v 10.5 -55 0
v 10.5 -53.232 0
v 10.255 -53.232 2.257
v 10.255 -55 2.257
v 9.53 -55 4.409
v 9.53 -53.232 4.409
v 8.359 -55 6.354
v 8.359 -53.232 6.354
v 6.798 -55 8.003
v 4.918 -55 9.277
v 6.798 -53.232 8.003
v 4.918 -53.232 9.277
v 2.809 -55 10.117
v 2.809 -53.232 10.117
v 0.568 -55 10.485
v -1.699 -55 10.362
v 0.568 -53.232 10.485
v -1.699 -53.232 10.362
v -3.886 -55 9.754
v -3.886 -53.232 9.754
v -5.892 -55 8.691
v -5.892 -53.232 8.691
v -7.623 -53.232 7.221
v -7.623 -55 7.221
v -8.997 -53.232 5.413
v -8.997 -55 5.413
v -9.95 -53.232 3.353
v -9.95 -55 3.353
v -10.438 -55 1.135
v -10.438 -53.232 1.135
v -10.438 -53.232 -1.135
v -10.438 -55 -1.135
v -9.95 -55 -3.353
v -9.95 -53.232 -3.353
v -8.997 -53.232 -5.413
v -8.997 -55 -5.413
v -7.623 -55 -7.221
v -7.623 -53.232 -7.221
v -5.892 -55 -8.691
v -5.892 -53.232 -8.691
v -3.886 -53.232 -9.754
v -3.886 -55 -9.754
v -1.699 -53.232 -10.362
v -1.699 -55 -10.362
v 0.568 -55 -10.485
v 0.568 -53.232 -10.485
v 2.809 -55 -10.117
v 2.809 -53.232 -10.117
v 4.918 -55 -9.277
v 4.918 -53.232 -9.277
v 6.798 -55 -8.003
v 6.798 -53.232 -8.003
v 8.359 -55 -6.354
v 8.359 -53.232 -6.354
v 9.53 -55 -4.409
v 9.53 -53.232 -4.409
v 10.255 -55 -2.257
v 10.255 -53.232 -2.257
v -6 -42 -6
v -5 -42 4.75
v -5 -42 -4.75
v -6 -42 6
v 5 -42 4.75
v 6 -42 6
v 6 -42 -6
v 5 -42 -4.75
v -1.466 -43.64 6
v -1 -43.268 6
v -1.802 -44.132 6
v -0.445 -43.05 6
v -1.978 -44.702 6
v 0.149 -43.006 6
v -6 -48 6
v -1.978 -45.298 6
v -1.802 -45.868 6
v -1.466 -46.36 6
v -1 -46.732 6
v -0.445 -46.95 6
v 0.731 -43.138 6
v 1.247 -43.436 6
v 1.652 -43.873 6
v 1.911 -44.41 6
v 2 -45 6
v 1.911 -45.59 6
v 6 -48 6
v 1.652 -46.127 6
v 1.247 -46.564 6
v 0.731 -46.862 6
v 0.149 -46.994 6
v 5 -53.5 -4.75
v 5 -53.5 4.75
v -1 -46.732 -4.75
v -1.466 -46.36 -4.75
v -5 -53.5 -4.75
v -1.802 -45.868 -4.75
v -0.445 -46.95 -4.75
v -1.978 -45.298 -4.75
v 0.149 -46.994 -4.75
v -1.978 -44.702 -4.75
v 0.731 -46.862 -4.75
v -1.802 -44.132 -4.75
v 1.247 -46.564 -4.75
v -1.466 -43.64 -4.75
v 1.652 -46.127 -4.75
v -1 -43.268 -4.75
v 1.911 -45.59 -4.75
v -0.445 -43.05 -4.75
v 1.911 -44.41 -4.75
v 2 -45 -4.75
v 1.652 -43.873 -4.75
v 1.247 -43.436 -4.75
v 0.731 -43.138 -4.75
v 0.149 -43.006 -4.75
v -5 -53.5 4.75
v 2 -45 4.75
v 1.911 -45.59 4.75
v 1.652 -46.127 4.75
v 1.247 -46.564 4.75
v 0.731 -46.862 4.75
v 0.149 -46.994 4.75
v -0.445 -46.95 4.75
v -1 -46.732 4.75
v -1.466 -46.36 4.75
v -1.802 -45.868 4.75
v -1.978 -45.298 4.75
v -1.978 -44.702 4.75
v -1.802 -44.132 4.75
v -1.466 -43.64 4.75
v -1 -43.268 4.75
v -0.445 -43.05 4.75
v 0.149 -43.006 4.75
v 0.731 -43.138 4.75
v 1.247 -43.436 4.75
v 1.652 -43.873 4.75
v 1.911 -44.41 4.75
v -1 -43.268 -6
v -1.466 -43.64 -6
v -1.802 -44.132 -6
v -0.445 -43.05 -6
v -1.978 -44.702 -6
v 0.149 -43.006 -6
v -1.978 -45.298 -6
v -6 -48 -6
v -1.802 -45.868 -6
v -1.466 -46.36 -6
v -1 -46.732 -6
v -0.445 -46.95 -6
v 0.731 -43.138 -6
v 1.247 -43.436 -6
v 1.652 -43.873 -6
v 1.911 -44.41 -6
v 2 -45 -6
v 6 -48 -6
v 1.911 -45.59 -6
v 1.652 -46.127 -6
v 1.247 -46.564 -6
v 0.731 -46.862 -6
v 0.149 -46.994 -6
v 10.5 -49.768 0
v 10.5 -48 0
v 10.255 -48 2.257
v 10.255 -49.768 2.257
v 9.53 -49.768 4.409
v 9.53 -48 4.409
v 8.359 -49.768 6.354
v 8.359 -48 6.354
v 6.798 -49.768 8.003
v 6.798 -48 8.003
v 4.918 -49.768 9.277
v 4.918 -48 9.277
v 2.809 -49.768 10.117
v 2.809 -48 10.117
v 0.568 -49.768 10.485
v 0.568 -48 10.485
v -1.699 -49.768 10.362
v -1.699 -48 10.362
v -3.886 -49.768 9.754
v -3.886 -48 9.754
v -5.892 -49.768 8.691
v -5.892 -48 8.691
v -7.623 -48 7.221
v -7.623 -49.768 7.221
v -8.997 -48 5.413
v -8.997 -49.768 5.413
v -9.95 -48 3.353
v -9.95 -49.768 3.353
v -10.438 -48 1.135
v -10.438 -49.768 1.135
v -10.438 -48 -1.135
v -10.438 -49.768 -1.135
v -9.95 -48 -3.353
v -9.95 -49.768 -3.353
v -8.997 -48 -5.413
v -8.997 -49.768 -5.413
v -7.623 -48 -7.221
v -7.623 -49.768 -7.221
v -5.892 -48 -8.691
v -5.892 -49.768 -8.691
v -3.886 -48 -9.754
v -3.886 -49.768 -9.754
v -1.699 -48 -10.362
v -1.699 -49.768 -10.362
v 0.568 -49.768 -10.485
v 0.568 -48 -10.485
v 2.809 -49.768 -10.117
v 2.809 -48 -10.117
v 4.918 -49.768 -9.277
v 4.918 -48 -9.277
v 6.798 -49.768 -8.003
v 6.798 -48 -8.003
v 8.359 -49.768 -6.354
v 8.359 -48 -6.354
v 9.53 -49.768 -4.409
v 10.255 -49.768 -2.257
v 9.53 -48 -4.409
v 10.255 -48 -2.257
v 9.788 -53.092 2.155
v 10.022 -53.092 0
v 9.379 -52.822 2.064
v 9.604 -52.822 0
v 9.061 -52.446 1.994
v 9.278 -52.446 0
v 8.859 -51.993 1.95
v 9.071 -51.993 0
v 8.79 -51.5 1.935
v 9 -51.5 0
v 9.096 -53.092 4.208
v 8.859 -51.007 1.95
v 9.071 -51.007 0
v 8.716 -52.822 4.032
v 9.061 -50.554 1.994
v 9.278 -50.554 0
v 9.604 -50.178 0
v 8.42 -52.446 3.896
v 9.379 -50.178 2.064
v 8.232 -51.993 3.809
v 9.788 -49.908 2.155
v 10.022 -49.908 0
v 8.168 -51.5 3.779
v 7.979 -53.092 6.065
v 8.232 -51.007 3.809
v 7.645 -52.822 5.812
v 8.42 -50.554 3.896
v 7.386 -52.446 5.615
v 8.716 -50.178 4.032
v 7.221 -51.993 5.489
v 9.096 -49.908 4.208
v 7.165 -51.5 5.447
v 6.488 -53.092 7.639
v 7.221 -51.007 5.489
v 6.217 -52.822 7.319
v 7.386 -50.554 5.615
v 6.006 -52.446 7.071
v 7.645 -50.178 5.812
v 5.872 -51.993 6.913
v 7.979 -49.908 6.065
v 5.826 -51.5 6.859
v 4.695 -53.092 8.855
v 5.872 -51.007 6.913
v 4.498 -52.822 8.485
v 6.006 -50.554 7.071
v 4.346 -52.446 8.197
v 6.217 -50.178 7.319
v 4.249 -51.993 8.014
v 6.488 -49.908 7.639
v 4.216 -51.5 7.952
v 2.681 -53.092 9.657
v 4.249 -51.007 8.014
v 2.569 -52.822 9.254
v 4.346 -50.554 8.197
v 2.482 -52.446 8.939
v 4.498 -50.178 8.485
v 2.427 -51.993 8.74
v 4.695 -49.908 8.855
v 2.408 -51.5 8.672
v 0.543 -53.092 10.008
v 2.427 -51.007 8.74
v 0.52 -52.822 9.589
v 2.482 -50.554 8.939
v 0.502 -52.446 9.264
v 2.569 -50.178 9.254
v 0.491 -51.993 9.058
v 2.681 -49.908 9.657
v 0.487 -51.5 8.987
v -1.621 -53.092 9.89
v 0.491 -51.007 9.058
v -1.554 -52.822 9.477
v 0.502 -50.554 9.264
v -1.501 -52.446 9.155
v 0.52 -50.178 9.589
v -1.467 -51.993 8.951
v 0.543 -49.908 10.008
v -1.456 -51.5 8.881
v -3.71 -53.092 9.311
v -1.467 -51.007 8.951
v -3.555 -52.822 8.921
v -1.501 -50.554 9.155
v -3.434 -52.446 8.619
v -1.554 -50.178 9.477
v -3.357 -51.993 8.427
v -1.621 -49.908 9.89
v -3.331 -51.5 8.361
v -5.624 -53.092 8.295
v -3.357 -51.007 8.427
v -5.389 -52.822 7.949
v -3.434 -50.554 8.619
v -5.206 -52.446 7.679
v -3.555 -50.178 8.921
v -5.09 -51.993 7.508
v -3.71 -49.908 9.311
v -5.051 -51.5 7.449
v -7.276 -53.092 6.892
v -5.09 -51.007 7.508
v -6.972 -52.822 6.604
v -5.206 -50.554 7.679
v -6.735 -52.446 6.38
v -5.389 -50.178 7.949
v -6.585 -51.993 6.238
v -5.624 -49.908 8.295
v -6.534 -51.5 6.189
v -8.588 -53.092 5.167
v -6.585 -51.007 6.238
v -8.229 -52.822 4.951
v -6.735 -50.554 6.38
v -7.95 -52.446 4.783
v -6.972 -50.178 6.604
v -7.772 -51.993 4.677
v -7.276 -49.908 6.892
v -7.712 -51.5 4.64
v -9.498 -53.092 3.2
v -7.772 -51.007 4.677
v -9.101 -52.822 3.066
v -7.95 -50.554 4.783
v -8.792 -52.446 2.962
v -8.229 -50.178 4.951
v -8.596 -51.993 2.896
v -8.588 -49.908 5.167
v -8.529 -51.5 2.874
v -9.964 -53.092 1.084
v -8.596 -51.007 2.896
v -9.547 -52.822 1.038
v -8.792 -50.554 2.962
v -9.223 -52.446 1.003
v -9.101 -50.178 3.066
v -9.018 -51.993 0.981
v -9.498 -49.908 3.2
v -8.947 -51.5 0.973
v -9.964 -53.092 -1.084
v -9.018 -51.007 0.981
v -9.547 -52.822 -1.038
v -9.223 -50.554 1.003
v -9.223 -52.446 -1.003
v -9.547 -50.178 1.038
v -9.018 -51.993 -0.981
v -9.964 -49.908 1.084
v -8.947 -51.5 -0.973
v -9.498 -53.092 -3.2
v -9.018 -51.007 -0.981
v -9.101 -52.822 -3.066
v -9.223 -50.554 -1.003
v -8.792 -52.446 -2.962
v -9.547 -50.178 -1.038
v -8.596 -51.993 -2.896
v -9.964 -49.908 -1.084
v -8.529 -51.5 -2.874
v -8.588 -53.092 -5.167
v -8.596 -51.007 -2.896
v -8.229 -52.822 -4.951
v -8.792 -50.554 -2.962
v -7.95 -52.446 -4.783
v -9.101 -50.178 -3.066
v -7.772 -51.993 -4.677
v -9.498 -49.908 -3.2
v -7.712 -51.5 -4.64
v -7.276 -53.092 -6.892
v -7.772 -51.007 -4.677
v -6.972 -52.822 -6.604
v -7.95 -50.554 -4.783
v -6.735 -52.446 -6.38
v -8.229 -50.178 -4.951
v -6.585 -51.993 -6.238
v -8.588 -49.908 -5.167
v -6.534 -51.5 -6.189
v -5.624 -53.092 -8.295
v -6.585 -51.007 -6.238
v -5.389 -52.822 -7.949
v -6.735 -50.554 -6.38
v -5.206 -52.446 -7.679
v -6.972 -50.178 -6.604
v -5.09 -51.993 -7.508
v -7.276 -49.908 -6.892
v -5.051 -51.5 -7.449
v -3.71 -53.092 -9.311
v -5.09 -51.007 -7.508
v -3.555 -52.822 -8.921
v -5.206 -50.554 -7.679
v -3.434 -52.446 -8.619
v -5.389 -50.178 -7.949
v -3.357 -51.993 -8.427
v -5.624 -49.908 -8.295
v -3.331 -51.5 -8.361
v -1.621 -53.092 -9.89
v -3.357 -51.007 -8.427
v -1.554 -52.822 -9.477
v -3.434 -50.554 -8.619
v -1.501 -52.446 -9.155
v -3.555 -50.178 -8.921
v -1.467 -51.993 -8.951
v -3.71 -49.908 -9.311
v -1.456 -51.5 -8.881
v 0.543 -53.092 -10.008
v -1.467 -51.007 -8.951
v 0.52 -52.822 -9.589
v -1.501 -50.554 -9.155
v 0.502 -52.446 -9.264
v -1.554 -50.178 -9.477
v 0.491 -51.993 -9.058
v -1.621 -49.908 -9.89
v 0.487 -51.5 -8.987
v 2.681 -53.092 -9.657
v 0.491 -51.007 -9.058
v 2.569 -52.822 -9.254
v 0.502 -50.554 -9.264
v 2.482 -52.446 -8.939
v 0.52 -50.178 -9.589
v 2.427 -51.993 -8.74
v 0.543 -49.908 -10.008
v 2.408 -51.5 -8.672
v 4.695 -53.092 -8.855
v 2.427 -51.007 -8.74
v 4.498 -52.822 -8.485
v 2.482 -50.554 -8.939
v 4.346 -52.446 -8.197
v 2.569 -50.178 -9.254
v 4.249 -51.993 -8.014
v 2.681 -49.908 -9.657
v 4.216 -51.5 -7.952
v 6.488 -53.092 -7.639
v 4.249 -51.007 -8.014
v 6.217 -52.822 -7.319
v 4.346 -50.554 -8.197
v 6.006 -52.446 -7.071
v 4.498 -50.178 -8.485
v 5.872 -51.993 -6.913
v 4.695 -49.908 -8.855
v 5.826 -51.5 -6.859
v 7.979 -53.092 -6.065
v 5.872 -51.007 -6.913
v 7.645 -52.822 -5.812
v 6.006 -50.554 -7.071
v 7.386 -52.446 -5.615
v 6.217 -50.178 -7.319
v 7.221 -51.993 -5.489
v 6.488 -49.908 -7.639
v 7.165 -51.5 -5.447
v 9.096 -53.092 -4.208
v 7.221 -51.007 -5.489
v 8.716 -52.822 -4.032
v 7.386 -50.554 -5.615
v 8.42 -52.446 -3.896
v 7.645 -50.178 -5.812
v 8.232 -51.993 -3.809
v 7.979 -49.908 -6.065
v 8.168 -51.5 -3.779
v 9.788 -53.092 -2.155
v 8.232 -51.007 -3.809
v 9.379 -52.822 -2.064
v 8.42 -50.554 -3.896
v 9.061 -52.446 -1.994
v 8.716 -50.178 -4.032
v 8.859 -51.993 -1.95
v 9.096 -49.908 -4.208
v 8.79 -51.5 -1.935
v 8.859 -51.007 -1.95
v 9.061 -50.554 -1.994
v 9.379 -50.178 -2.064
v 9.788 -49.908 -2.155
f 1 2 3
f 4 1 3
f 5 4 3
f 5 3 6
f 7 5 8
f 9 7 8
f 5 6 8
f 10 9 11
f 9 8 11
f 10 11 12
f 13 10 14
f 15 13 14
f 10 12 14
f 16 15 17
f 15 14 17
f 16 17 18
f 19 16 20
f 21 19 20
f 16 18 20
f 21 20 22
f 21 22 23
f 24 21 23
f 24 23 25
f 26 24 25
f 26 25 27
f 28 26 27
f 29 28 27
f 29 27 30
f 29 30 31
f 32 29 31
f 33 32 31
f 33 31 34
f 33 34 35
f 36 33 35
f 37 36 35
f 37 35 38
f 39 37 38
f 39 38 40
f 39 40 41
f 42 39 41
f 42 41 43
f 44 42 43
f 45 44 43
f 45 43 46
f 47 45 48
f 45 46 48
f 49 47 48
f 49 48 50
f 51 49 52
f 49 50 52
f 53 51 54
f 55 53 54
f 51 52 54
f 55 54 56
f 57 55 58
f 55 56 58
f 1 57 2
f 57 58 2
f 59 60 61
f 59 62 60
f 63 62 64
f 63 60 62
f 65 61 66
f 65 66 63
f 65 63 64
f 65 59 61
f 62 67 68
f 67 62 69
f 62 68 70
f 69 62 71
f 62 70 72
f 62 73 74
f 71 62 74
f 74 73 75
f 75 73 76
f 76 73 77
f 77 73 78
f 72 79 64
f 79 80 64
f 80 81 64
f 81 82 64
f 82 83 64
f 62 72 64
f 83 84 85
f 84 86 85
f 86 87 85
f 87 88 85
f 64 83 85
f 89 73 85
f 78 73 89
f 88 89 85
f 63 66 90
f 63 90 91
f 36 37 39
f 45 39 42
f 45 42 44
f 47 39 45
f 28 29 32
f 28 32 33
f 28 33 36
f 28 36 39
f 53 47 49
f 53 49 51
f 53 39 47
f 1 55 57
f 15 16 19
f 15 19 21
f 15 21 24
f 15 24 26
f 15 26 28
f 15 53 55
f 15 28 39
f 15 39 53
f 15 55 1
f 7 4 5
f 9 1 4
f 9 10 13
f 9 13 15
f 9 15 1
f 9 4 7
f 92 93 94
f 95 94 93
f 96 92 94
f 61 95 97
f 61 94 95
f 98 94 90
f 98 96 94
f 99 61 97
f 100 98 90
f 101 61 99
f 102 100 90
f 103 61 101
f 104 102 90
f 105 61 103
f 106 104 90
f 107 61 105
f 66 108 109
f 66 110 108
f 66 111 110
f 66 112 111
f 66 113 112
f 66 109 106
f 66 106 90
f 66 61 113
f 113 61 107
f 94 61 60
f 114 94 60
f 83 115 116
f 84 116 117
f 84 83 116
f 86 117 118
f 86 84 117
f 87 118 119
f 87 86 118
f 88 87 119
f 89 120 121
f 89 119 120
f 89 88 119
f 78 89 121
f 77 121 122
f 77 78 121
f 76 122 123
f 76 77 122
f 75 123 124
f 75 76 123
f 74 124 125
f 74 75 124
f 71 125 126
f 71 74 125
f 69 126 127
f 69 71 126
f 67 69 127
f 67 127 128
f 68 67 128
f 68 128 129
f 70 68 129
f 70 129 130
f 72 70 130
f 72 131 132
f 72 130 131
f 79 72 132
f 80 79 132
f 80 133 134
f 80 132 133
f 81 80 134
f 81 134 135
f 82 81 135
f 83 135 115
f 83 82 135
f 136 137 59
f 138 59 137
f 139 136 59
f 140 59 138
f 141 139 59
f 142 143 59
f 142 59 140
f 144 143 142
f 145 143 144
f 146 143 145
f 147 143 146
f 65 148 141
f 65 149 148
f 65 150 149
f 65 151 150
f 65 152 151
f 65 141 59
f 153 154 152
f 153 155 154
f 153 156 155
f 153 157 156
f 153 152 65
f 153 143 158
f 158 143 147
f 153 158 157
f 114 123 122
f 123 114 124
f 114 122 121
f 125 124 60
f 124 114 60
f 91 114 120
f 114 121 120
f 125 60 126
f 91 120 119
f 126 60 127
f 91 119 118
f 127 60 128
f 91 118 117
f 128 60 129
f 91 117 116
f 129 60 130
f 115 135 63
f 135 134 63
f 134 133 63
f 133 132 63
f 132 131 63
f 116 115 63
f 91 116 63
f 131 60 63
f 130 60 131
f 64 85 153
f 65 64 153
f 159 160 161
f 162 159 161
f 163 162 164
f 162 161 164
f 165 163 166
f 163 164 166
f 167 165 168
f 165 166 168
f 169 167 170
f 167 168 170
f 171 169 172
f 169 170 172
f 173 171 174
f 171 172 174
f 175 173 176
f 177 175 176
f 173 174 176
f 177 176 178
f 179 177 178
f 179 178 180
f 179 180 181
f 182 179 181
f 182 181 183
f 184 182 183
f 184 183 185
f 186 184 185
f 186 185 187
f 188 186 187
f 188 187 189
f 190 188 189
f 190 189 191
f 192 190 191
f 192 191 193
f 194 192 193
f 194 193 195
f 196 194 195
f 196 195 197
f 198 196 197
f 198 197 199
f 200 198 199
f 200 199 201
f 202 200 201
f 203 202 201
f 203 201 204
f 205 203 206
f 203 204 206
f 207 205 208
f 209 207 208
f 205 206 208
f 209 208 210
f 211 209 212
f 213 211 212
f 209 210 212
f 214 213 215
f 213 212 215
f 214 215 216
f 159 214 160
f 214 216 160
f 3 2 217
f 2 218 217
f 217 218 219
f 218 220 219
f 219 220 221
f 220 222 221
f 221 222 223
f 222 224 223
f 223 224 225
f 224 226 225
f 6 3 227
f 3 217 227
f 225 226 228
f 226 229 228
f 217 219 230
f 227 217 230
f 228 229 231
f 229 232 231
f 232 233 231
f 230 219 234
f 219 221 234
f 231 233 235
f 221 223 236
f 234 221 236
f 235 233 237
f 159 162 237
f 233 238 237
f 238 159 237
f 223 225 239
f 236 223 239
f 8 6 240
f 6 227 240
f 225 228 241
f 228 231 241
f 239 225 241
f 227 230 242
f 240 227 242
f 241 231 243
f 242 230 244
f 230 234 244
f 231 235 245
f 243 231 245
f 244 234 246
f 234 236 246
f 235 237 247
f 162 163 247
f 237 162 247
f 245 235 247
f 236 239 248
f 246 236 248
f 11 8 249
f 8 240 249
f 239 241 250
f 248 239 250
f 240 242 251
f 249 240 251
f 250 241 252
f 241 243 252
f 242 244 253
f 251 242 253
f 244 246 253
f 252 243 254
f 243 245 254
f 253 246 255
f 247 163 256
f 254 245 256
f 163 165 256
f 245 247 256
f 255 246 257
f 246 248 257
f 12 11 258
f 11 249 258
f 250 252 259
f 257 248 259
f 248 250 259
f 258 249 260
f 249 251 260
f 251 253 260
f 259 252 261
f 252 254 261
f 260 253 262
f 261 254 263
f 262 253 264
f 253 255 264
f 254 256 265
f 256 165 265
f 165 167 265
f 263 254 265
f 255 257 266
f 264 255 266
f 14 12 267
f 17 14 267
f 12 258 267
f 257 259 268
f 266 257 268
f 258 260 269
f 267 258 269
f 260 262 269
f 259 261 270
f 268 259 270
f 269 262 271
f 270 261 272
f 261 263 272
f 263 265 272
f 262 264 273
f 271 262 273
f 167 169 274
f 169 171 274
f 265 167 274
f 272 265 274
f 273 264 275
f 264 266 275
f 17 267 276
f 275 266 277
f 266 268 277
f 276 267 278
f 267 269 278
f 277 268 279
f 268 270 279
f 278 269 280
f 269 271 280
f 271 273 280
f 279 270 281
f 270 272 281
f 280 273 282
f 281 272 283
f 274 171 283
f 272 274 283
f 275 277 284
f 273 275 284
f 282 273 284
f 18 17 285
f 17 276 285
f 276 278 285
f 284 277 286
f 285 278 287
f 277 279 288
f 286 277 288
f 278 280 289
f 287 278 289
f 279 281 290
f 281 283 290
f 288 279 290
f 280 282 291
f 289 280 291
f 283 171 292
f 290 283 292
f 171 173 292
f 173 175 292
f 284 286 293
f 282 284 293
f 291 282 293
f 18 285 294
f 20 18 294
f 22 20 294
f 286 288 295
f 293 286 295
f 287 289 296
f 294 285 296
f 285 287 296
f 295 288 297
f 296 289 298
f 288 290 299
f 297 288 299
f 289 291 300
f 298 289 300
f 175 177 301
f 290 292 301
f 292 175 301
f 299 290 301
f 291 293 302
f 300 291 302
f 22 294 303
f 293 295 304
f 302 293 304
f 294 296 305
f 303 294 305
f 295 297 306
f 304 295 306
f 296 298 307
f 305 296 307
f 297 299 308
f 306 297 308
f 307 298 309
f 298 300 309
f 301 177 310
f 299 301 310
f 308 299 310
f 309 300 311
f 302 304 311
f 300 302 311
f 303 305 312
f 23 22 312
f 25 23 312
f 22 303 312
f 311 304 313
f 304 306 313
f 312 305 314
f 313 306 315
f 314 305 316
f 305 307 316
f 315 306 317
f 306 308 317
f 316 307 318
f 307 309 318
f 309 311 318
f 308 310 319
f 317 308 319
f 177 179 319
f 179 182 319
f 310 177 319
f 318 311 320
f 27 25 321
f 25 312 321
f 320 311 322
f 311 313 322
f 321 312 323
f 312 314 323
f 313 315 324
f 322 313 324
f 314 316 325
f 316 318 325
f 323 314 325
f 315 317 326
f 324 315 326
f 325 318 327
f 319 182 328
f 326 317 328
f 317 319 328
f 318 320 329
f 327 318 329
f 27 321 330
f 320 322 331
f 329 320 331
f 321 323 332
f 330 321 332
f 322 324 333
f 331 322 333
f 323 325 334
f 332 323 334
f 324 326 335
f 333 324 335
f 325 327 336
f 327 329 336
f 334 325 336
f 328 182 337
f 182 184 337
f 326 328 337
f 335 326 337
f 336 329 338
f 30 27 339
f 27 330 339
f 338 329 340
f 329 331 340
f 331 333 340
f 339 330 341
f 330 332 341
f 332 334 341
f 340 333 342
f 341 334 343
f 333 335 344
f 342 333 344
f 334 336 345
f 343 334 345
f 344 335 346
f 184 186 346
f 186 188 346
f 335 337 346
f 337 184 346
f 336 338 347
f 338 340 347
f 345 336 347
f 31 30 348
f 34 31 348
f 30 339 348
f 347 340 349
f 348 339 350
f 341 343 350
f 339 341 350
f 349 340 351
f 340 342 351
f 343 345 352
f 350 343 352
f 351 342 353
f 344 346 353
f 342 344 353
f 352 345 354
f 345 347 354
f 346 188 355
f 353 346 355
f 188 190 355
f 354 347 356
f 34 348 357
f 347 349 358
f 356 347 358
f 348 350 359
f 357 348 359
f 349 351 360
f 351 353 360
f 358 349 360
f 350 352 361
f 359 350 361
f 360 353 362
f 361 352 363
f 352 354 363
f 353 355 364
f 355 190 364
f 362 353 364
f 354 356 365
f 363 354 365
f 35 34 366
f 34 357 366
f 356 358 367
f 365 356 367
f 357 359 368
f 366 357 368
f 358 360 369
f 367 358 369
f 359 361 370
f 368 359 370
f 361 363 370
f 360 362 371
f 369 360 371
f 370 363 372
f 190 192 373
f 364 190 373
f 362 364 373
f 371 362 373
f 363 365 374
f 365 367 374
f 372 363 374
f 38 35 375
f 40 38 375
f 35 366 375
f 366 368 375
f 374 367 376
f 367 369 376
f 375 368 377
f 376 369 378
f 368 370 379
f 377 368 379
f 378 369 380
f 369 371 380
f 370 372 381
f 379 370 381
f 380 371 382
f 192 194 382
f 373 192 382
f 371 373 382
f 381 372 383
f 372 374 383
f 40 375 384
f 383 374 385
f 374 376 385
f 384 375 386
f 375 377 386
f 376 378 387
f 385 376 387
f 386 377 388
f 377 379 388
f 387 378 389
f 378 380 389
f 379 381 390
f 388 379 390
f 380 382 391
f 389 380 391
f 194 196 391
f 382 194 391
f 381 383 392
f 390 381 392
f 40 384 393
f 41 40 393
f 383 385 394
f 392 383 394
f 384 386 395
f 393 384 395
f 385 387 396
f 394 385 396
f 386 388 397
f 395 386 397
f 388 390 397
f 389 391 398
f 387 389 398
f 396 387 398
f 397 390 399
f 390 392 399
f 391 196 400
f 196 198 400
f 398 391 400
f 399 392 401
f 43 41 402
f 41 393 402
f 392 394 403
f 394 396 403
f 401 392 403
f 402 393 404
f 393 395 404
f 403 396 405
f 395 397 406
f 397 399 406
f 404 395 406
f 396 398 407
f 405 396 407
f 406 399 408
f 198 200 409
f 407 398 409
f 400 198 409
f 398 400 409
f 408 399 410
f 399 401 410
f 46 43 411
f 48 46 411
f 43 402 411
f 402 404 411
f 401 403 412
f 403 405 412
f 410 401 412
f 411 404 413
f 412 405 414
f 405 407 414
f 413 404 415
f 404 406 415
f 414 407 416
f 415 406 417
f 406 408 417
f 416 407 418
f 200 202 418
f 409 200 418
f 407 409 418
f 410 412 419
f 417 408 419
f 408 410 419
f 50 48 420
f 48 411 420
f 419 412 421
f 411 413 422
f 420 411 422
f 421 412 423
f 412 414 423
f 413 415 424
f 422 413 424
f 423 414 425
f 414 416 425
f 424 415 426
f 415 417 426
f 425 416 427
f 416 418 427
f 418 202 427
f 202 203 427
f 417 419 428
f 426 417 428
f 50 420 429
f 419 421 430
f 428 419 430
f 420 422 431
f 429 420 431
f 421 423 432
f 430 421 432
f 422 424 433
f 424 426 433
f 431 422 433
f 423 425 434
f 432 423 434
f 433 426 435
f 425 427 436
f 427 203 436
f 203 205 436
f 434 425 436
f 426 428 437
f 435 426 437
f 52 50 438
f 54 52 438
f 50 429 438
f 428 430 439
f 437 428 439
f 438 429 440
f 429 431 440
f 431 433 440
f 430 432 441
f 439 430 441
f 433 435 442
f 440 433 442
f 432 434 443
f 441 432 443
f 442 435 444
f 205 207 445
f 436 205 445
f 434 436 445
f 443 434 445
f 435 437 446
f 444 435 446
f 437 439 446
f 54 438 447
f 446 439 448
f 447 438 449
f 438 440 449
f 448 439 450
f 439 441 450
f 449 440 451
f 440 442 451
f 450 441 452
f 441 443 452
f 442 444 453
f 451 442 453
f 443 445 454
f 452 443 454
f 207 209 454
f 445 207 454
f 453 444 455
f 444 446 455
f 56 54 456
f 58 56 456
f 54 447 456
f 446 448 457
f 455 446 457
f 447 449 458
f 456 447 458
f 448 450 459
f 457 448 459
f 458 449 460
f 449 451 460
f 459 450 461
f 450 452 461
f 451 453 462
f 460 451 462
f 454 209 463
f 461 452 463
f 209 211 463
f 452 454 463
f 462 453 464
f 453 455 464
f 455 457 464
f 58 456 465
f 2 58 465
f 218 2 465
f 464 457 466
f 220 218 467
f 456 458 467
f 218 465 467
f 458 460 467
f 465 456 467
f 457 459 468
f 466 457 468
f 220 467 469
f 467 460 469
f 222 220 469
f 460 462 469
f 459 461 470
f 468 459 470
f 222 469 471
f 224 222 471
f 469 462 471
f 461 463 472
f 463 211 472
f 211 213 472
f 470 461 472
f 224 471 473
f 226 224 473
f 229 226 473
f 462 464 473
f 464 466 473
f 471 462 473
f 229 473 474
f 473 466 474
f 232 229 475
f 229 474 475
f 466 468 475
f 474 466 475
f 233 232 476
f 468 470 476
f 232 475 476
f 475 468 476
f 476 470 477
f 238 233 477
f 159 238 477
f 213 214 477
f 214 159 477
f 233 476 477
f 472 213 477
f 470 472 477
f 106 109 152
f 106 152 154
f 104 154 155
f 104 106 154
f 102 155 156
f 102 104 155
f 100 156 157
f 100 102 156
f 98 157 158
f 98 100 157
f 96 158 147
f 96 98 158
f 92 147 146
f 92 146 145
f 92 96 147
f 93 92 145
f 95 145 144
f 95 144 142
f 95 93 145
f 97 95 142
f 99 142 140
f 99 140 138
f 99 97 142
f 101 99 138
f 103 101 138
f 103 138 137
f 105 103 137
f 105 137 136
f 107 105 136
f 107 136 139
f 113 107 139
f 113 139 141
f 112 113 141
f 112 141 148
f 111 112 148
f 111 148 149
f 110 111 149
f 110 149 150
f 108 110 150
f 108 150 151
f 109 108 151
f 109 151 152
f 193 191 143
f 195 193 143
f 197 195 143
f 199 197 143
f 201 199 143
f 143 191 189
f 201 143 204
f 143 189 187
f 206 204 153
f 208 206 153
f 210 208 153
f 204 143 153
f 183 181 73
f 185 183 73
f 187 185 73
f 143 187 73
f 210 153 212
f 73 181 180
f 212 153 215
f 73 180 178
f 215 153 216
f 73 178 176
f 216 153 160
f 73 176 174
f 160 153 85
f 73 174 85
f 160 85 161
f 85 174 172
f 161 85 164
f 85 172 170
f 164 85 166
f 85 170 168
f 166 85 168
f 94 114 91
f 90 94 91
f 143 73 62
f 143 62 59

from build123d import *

# Parameters (mm, degrees)
CYLINDER019_R     = 10.5
CYLINDER019_DEPTH = 7
BOX016_W          = 12
BOX016_H          = 12
BOX016_DEPTH      = 6
BOX017_W          = 10
BOX017_H          = 9.5
BOX017_DEPTH      = 11.5
CYLINDER020_R     = 2
CYLINDER020_DEPTH = 12
TORUS_R           = 1.75


with BuildPart() as part:
    # Cylinder019 → Cylinder019 (join)
    with BuildSketch(Plane.XZ):
        Circle(CYLINDER019_R)
    extrude(amount=CYLINDER019_DEPTH)

    # Box016 → Box016 (join)
    with BuildSketch(Plane(origin=(-6, 0, 6), x_dir=(1, 0, 0), z_dir=(0, 1, 0))):
        with Locations((6, 6)):
            Rectangle(BOX016_W, BOX016_H)
    extrude(amount=BOX016_DEPTH)

    # Box017 → Box017 (cut)
    with BuildSketch(Plane(origin=(-5, 6, -4.75), x_dir=(1, 0, 0), z_dir=(0, -1, 0))):
        with Locations((5, 4.75)):
            Rectangle(BOX017_W, BOX017_H)
    extrude(amount=BOX017_DEPTH, mode=Mode.SUBTRACT)

    # Cylinder020 → Cylinder020 (cut)
    with BuildSketch(Plane(origin=(0, 3, 6), x_dir=(1, 0, 0), z_dir=(0, 0, -1))):
        Circle(CYLINDER020_R)
    extrude(amount=CYLINDER020_DEPTH, mode=Mode.SUBTRACT)

    # Torus → Torus (revolve, cut)
    with BuildSketch(Plane(origin=(0, -3.5, 0), x_dir=(1, 0, 0), z_dir=(0, 0, -1))):
        with Locations((10.75, 0)):
            Circle(TORUS_R)
    revolve(axis=Axis((0, -3.5, 0), (0, -1, 0)), mode=Mode.SUBTRACT)


with BuildPart() as part_1:
    # Body004 placement: moved
    add(part.part.moved(Location((0, -48, 0))))


solid = part_1.part
